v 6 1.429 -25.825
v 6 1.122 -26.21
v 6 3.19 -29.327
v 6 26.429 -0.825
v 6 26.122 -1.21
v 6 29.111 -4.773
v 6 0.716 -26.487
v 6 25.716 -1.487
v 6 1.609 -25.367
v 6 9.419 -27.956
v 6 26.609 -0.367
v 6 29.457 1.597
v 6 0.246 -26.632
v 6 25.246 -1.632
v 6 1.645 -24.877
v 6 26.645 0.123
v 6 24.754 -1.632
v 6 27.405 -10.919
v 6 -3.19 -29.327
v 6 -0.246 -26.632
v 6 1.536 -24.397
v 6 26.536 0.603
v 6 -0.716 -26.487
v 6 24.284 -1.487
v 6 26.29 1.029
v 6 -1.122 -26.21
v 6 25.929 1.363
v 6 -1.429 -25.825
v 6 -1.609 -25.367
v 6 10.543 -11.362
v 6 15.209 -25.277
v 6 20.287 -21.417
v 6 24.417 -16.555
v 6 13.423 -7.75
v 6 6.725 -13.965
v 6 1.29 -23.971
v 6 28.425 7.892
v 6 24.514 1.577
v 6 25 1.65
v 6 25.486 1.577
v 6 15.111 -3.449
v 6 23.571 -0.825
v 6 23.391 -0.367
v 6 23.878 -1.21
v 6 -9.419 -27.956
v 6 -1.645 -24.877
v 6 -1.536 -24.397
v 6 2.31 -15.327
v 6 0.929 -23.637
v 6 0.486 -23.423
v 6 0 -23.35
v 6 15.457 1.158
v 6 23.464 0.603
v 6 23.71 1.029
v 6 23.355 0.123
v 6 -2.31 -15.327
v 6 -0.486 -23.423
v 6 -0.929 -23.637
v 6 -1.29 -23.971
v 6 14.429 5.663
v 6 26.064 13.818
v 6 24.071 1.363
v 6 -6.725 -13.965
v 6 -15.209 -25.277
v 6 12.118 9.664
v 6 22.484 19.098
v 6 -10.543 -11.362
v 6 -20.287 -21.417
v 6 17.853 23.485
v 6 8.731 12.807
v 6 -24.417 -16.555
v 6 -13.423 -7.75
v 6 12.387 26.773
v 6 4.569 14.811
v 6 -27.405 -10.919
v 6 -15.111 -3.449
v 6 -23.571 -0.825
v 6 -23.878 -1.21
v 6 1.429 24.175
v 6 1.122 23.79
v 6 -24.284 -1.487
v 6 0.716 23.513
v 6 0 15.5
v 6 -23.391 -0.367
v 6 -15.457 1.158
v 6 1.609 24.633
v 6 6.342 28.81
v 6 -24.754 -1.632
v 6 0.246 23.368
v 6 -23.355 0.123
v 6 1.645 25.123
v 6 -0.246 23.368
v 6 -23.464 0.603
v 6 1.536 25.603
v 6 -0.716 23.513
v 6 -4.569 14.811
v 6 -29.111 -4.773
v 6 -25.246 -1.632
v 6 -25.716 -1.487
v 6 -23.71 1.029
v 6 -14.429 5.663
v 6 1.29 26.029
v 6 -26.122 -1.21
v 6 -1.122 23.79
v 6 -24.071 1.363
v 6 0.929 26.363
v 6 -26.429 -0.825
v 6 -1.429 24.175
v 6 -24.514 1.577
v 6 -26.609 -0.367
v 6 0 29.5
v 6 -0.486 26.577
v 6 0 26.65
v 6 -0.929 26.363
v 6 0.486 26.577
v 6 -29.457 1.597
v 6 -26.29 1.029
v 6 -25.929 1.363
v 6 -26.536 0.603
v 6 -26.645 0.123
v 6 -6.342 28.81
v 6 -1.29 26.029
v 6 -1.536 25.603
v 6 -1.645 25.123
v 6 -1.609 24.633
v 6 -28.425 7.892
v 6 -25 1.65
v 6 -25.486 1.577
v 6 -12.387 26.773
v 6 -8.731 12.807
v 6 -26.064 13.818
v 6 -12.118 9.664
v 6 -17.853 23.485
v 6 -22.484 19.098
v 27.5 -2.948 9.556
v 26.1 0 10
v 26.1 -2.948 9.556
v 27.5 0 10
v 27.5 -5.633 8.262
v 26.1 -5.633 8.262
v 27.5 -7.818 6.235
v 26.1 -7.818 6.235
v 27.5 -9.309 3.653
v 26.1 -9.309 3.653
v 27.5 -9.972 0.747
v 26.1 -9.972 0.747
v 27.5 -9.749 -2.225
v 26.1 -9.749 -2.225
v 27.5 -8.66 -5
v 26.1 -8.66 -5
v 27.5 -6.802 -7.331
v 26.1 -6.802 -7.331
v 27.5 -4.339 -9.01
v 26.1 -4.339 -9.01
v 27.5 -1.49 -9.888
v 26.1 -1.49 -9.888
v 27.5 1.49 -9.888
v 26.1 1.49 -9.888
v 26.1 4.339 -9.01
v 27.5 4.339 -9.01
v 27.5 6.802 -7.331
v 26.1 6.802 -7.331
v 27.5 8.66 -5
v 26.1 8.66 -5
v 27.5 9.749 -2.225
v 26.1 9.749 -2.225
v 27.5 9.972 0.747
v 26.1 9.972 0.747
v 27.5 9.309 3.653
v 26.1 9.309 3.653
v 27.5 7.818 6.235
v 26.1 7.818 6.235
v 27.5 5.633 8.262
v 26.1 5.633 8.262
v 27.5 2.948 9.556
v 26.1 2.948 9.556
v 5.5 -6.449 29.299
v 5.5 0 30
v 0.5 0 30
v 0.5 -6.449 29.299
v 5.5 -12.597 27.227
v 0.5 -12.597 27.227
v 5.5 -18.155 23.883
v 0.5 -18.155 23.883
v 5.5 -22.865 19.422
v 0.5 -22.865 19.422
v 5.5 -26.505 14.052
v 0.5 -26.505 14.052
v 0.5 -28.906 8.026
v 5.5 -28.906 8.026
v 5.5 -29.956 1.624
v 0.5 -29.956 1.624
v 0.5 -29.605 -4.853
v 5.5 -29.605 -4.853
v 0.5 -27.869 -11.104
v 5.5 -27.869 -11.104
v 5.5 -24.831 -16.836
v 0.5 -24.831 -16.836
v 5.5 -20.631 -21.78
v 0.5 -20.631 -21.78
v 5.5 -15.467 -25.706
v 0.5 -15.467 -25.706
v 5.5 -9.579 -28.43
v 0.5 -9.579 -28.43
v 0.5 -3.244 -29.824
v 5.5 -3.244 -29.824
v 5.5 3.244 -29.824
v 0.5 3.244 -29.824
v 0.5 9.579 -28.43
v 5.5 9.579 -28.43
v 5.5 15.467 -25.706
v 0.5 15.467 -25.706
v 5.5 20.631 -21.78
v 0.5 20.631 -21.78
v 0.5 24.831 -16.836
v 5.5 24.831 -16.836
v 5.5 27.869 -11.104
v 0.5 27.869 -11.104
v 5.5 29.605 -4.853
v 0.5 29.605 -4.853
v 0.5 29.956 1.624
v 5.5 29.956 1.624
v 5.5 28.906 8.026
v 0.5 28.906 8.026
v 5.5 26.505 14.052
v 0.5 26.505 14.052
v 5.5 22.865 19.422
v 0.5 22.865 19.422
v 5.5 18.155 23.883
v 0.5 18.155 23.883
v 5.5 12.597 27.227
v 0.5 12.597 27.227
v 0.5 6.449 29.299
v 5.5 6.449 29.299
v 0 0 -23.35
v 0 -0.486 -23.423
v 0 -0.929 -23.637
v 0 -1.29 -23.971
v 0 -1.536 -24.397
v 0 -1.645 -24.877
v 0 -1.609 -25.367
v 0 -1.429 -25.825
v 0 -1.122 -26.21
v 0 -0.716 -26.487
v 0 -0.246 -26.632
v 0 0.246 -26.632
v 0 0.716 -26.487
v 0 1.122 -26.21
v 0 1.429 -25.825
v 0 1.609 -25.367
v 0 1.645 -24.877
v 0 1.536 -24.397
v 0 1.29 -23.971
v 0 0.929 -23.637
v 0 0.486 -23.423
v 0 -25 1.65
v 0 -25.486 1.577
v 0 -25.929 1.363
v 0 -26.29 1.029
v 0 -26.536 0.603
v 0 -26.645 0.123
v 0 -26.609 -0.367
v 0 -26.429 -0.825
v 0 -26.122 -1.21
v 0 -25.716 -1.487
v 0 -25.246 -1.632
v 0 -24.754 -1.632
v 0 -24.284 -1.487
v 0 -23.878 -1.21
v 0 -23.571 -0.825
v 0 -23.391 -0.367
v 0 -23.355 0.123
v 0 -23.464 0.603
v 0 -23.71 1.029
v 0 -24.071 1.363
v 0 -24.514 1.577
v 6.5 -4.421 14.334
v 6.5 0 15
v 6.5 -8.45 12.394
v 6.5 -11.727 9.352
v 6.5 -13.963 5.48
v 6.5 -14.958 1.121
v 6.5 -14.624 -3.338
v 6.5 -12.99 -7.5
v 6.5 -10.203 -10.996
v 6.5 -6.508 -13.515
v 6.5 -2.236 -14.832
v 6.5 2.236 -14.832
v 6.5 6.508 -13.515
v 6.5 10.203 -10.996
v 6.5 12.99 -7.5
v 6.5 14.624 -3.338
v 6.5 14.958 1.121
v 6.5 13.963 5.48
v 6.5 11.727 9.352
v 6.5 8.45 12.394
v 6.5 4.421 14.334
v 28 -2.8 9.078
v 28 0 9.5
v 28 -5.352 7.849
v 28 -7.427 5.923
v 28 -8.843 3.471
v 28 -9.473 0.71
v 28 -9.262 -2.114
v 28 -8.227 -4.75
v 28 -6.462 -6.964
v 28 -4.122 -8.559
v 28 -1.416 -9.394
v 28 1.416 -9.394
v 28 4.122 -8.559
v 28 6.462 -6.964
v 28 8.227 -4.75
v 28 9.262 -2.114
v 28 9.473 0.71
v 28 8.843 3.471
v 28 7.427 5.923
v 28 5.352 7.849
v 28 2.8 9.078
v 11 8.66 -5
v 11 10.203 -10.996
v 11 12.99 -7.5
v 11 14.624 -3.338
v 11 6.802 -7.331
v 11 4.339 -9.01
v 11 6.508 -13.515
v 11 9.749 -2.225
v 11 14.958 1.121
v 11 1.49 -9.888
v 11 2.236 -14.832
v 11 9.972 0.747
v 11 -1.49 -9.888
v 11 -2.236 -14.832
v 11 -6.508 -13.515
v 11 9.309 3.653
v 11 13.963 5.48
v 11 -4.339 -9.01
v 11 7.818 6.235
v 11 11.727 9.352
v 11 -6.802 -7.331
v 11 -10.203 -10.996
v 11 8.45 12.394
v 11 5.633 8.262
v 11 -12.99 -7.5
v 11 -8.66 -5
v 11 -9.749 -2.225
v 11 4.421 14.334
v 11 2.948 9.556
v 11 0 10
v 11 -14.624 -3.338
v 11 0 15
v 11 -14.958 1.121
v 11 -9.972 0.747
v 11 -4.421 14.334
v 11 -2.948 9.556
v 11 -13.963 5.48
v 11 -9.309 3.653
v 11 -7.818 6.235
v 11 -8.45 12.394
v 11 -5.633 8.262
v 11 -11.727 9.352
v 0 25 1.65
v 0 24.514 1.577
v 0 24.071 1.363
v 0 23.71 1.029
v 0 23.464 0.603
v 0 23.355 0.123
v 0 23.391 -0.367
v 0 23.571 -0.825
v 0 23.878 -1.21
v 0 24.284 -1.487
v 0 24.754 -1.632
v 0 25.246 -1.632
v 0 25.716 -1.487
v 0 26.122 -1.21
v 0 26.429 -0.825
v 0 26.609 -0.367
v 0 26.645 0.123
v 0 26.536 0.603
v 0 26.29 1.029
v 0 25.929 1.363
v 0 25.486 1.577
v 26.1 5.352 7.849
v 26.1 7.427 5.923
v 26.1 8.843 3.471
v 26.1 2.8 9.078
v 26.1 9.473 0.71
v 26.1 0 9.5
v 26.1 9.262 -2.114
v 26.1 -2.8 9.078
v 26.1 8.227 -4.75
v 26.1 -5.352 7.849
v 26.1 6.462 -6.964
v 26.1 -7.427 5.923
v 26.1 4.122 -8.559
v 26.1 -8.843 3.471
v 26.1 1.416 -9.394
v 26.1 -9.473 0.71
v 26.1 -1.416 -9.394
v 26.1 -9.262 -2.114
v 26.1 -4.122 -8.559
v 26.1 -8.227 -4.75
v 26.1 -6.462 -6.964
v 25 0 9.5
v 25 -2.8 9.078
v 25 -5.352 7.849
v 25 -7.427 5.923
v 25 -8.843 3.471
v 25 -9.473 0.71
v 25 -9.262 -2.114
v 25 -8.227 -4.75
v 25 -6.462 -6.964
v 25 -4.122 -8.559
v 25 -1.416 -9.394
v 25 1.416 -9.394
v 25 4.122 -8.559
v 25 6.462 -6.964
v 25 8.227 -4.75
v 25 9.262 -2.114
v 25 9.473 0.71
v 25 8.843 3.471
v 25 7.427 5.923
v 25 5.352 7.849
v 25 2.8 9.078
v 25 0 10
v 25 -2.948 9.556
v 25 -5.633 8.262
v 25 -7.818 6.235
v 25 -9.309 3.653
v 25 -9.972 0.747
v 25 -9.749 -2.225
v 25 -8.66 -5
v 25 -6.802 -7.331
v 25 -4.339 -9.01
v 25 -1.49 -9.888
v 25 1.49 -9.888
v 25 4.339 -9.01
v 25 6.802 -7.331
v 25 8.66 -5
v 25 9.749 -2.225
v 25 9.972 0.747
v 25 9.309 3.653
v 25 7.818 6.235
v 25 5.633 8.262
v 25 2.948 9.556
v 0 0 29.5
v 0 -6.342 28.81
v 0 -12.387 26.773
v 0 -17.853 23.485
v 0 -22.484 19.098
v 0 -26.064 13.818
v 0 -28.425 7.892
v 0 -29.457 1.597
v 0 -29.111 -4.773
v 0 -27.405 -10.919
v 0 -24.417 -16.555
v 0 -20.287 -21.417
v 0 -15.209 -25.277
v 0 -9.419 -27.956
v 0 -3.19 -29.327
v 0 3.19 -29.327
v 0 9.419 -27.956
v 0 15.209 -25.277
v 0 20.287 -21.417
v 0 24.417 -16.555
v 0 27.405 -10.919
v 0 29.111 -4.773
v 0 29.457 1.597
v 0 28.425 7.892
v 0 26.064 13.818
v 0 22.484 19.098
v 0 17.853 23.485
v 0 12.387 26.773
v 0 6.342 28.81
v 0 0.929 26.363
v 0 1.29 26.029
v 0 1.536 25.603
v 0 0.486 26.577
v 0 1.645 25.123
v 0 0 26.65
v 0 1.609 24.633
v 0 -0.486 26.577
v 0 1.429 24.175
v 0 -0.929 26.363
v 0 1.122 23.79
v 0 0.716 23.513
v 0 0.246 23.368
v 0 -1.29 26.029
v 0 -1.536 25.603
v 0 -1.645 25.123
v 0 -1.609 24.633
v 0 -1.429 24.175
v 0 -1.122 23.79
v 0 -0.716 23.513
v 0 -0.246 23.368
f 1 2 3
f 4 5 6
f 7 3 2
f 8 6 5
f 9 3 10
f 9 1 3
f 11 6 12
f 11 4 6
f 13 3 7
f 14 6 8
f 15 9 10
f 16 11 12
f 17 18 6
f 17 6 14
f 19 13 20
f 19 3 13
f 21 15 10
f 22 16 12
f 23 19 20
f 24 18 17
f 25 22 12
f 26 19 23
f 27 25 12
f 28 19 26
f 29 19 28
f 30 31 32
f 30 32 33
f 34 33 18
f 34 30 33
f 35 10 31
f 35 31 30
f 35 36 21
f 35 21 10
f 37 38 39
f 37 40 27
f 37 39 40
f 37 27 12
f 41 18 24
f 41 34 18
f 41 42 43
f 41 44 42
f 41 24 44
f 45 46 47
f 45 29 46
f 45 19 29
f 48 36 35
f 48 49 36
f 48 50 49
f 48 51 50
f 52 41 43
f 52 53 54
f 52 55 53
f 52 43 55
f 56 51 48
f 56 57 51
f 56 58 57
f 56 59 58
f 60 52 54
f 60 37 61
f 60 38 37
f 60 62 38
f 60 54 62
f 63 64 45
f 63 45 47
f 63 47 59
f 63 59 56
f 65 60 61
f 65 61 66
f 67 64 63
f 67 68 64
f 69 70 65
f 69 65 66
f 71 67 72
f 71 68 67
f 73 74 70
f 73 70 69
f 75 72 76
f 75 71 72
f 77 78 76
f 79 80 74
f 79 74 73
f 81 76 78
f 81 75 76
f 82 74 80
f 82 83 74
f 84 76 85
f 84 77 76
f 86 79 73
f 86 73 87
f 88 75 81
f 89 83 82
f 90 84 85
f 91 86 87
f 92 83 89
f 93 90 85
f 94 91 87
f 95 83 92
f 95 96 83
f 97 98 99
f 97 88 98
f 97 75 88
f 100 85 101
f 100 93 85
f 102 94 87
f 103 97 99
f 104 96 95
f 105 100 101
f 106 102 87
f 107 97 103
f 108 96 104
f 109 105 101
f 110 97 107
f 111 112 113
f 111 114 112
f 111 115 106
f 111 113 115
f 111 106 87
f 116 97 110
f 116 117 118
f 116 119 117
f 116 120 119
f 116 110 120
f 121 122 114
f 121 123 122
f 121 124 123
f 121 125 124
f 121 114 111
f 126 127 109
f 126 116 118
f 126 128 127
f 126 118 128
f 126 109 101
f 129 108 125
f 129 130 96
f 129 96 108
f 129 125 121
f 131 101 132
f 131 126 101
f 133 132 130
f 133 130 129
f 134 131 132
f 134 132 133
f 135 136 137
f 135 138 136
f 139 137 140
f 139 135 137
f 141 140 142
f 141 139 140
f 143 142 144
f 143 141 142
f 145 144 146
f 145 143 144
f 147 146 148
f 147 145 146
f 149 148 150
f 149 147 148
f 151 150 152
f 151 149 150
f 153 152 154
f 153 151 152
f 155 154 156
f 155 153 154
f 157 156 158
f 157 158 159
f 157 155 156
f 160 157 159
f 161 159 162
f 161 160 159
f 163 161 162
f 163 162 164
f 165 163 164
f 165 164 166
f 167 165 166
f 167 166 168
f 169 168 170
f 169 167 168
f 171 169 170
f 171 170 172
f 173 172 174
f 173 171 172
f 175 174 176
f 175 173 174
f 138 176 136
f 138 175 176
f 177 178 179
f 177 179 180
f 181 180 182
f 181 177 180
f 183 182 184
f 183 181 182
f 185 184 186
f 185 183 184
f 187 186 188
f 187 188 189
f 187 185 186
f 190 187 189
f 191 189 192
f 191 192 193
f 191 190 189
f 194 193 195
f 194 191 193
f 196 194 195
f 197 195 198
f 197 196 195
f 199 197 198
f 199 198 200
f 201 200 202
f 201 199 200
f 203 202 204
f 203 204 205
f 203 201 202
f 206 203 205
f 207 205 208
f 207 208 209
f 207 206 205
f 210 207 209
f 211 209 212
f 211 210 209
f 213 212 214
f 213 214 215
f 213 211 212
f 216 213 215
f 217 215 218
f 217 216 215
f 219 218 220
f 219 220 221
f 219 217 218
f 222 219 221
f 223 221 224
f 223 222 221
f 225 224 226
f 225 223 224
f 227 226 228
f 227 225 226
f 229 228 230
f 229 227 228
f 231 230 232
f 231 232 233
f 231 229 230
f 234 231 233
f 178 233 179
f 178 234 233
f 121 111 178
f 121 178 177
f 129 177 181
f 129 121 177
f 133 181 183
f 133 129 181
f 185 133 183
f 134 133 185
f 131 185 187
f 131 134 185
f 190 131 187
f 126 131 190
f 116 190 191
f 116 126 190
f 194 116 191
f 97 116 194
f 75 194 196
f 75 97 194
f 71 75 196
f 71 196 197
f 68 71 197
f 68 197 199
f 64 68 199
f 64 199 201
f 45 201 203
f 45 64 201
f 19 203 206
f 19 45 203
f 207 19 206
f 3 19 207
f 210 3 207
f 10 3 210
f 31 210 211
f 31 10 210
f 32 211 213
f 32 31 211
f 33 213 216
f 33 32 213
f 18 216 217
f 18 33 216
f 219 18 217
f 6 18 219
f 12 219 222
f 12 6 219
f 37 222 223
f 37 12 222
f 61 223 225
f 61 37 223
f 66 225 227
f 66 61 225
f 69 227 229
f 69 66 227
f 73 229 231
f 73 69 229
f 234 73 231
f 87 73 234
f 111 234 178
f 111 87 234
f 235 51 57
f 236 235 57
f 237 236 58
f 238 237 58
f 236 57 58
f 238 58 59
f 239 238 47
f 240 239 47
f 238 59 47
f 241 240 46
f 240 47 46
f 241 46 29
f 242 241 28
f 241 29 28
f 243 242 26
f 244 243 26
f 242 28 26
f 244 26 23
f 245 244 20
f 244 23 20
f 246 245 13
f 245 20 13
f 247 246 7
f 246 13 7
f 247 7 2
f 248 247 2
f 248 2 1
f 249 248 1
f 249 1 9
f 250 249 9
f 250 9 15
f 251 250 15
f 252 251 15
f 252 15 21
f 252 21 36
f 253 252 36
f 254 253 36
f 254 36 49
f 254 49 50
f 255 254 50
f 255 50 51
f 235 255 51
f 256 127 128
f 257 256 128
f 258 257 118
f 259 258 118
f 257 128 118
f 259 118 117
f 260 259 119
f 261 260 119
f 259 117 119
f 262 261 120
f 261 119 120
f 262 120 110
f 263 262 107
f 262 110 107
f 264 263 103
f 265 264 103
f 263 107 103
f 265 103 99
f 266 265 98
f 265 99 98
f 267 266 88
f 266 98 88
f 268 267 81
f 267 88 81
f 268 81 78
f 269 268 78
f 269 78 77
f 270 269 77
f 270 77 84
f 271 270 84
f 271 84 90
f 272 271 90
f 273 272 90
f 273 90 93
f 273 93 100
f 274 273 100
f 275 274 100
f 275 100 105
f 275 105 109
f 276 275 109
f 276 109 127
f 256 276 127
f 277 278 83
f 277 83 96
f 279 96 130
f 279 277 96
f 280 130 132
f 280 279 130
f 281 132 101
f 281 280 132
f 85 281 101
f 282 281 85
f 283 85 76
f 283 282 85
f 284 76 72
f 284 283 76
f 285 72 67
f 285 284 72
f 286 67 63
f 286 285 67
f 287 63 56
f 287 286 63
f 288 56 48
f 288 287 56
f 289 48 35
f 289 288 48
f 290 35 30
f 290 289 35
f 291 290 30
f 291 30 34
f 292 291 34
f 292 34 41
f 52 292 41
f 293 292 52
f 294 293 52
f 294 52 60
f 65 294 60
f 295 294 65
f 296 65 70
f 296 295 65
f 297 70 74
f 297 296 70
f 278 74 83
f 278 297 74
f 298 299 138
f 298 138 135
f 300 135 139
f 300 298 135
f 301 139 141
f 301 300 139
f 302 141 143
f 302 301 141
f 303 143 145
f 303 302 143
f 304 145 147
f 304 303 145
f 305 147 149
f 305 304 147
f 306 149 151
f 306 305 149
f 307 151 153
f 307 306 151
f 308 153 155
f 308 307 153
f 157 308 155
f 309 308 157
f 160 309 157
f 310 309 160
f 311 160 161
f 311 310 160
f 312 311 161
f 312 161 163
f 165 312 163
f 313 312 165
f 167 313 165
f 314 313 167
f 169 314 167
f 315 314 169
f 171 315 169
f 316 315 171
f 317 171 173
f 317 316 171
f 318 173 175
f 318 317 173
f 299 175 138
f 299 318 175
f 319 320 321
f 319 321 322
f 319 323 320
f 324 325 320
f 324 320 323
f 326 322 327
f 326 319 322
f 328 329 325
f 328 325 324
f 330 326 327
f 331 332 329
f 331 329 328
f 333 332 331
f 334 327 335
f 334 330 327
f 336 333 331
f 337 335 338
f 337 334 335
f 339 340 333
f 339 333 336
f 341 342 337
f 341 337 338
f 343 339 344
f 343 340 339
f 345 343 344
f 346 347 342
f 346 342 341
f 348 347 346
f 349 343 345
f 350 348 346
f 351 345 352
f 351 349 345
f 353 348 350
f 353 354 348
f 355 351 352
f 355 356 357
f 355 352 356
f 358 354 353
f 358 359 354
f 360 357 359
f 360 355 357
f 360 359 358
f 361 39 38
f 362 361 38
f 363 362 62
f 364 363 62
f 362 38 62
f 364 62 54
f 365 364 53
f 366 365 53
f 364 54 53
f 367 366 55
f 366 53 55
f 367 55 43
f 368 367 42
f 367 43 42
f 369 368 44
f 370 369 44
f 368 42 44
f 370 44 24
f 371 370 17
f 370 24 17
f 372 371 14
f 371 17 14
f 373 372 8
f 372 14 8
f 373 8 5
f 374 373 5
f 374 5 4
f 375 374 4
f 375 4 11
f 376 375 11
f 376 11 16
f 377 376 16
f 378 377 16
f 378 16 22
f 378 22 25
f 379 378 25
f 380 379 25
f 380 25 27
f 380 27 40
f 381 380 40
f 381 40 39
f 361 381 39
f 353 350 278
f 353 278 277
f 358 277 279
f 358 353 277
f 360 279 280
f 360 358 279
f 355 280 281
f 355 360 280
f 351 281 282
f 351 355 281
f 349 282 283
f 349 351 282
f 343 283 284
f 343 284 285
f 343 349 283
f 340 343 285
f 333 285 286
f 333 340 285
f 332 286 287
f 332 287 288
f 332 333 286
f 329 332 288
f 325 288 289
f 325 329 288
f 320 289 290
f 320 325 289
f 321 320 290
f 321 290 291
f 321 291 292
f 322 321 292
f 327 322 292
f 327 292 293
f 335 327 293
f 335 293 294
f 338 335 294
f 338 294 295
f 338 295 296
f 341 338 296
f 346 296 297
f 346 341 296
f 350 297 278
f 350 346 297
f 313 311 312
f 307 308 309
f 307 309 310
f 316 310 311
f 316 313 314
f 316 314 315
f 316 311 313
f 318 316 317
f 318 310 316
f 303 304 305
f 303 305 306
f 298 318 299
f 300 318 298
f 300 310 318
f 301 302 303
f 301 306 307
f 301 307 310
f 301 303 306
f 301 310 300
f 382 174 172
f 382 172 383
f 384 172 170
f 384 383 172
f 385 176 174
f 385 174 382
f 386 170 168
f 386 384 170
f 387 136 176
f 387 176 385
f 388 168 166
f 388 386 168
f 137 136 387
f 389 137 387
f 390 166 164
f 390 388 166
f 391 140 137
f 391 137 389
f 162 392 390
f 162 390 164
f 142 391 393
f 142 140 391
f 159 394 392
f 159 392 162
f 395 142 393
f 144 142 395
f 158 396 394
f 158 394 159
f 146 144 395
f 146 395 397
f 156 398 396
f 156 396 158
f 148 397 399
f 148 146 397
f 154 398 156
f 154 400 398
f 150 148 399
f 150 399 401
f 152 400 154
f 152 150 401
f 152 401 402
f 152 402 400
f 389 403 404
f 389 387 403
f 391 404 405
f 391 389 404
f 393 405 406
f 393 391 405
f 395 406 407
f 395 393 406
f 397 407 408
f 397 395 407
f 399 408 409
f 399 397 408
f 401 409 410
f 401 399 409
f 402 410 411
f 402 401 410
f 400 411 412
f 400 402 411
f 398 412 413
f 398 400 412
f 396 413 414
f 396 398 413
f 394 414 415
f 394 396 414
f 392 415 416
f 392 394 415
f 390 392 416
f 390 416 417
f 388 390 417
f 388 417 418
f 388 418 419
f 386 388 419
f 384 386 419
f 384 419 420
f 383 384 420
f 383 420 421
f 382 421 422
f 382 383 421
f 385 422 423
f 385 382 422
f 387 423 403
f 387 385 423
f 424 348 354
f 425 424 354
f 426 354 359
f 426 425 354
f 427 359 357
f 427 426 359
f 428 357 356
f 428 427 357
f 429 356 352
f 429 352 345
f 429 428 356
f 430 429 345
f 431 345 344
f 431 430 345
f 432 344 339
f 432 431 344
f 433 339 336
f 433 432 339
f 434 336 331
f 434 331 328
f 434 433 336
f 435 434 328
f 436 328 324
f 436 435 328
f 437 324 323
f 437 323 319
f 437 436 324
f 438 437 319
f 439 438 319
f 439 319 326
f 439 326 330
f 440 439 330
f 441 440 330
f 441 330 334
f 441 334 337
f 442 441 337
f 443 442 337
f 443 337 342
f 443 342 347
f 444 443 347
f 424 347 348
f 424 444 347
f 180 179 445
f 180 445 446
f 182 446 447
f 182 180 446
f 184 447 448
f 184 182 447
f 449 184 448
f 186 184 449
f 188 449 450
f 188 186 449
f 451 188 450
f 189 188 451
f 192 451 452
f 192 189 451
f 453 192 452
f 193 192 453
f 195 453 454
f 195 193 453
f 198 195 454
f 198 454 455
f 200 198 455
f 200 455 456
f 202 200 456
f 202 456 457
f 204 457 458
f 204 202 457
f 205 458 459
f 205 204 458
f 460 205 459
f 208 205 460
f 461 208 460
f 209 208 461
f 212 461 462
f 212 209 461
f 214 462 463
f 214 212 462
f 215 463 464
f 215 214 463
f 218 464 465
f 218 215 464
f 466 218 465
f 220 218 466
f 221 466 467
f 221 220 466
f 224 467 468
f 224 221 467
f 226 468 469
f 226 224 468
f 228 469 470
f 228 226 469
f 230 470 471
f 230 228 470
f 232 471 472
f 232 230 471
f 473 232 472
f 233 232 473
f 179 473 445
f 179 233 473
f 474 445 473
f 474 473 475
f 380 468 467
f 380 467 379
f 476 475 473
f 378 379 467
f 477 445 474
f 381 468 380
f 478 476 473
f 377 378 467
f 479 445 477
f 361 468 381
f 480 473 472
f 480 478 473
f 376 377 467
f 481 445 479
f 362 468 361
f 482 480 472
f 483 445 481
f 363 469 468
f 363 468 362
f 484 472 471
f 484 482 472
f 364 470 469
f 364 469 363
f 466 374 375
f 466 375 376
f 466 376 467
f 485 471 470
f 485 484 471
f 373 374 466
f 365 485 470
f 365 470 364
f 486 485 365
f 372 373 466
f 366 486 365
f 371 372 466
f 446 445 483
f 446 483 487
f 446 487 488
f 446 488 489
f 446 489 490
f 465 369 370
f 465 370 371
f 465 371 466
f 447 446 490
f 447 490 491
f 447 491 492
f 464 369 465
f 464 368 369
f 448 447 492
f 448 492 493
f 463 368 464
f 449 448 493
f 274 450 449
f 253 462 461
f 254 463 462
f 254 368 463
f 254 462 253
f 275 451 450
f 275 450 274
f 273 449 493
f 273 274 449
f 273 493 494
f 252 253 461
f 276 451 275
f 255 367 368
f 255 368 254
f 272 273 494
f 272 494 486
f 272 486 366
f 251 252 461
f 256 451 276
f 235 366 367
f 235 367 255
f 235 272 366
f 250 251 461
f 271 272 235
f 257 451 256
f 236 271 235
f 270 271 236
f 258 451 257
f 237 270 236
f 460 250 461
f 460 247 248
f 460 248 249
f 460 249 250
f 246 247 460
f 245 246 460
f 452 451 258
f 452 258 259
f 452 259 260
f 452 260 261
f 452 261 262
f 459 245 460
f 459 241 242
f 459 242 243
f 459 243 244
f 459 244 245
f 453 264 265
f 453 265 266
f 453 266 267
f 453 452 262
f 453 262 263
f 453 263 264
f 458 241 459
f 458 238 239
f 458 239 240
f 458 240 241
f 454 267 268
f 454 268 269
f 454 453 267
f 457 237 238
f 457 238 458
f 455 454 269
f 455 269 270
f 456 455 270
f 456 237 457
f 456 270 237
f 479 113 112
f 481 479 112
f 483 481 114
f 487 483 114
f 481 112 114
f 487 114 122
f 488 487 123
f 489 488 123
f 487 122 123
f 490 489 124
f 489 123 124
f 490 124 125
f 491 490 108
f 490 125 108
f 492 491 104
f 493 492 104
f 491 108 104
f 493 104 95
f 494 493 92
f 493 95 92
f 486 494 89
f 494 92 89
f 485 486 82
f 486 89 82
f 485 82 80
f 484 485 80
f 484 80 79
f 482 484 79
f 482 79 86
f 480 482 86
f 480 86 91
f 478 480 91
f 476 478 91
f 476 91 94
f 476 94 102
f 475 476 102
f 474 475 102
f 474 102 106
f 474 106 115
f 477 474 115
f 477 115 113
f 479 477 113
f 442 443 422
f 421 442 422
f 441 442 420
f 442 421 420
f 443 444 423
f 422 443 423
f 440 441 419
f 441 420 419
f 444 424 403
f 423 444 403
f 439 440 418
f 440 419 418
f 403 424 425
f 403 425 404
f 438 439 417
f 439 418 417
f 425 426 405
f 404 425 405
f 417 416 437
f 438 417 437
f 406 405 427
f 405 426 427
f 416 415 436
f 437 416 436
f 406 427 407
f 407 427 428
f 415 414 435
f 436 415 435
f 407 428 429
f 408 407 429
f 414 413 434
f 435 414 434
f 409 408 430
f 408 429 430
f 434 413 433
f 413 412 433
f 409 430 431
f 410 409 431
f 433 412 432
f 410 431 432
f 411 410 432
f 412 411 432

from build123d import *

# Parameters (mm, degrees)
HOLE_WIZARD_M4_1_D = 3.3
CHAMFER_1_SIZE     = 0.5
SKETCH_4_W         = 1.1
SKETCH_4_H         = 0.904012781


with BuildPart() as part:
    # 草图1 → 旋转1 (revolve)
    with BuildSketch(Plane.XY, mode=Mode.PRIVATE) as revolve_1_sk:
        Polygon((0, 0), (0, 30), (6, 30), (6, 15), (11, 15), (11, 10), (28, 10), (28, 0), align=None)
    revolve(revolve_1_sk.sketch.rotate(Axis((-37.713688213, 0, 0), (1, 0, 0)), 90), axis=Axis((-37.713688213, 0, 0), (1, 0, 0)))

    # M4 螺纹孔1 (through all)
    with Locations(Plane(origin=(0, 0, -25), x_dir=(0, 0, -1), z_dir=(-1, 0, 0))):
        with Locations((0, 0), (-25, -25), (-50, 0), (-25, 25)):
            Hole(HOLE_WIZARD_M4_1_D / 2)

    # 倒角1
    chamfer_1_edges = [part.edges().sort_by_distance(p)[0] for p in [
        (28, 0, -10),
        (6, 0, -15),
        (6, 0, -30),
        (0, 0, -30),
    ]]
    chamfer(chamfer_1_edges, length=CHAMFER_1_SIZE)

    # 草图4 → 切除-旋转1 (revolve, cut)
    with BuildSketch(Plane.XY, mode=Mode.PRIVATE) as cut_revolve_1_sk:
        with Locations((25.55, 9.95200639)):
            Rectangle(SKETCH_4_W, SKETCH_4_H)
    revolve(cut_revolve_1_sk.sketch.rotate(Axis((-5.373474488, 0, 0), (1, 0, 0)), 90), axis=Axis((-5.373474488, 0, 0), (1, 0, 0)), mode=Mode.SUBTRACT)


solid = part.part
